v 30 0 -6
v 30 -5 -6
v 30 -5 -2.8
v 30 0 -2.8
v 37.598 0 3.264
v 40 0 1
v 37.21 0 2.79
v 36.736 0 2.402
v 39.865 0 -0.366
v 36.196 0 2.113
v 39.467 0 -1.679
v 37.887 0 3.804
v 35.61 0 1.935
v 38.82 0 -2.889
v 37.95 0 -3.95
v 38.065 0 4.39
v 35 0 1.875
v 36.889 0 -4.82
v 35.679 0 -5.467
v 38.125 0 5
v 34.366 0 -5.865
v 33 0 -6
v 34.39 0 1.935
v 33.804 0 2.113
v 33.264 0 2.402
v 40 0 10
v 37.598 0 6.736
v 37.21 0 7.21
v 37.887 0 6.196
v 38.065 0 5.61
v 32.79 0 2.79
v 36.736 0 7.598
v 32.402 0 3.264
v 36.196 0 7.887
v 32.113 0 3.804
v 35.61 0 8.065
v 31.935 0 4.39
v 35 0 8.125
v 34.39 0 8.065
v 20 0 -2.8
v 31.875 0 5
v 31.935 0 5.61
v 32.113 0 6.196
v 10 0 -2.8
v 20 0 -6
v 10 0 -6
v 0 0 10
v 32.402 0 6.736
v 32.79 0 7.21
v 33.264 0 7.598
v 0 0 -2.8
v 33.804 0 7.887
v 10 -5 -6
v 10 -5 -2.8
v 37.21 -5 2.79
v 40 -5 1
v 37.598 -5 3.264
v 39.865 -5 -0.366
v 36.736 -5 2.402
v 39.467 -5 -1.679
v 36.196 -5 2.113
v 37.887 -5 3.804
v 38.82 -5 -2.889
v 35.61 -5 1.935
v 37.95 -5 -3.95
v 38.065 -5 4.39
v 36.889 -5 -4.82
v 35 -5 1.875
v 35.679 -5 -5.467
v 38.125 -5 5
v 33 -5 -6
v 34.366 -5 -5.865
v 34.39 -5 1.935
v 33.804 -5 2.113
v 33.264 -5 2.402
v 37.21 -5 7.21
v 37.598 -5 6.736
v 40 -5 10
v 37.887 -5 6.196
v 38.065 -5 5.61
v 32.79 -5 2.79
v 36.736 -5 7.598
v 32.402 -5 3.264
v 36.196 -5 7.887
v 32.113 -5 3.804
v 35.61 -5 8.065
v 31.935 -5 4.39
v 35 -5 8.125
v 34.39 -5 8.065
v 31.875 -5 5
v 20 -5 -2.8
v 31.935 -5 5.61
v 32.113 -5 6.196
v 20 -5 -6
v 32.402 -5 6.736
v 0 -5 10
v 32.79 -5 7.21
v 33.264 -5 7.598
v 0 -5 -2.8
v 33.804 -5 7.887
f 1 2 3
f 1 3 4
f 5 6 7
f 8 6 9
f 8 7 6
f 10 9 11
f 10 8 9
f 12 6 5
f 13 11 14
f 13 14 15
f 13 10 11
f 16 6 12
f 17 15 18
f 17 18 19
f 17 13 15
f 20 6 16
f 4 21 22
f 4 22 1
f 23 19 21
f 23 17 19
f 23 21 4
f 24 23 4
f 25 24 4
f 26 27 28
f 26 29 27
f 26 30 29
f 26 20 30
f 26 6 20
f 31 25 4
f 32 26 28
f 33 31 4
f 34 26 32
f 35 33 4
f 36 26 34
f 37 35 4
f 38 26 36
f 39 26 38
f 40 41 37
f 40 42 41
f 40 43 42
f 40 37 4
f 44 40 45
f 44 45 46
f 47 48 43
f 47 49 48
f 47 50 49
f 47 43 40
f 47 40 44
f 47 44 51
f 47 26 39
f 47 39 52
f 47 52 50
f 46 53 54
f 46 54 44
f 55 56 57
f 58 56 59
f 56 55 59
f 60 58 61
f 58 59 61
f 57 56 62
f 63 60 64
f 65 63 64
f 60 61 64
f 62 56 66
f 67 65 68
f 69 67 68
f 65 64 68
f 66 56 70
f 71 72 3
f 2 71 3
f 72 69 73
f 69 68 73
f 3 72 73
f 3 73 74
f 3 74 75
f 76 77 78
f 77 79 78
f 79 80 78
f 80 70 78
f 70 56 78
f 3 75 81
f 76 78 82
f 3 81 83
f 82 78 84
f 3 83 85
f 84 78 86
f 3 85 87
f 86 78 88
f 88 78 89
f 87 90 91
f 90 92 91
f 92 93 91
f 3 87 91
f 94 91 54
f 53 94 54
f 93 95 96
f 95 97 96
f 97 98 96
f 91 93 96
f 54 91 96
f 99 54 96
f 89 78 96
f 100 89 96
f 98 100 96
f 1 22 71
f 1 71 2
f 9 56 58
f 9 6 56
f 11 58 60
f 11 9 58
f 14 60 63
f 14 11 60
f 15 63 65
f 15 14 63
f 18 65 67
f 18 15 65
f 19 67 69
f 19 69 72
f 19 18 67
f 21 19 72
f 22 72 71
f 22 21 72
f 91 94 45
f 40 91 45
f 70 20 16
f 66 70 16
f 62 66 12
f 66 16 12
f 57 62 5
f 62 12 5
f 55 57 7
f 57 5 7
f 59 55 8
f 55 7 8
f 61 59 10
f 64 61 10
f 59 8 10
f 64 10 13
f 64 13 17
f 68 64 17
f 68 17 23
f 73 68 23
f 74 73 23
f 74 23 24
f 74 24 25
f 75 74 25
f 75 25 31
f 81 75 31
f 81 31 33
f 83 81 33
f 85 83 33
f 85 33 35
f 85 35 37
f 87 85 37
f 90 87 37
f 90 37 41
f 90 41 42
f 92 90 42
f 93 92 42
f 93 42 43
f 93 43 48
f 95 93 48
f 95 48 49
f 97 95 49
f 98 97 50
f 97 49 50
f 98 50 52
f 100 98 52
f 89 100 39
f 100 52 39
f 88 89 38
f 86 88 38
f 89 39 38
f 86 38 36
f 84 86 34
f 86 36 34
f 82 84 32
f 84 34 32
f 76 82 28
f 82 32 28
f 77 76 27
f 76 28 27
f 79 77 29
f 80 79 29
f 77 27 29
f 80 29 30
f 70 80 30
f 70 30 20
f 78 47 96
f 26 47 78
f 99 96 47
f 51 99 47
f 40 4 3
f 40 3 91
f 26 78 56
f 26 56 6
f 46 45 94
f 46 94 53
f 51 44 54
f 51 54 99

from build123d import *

# Parameters (mm, degrees)
ESQUISSE1_W                = 40
ESQUISSE1_H                = 5
BOSS_EXTRU_1_DEPTH         = 10
ESQUISSE2_R                = 3.125
ENL_V_MAT_EXTRU_1_DEPTH    = 6
ESQUISSE3_W                = 40
ESQUISSE3_H                = 5
BOSS_EXTRU_2_DEPTH         = 6
CONG_1_R                   = 7
ESQUISSE5_W                = 10
ESQUISSE5_H                = 5
ENL_V_MAT_EXTRU_3_DEPTH    = 3.2
R_P_TITION_LIN_AIRE1_COUNT = 2
R_P_TITION_LIN_AIRE1_PITCH = 20


with BuildPart() as part:
    # Esquisse1 → Boss.-Extru.1 (new body)
    with BuildSketch(Plane.XY):
        with Locations((20, -2.5)):
            Rectangle(ESQUISSE1_W, ESQUISSE1_H)
    extrude(amount=BOSS_EXTRU_1_DEPTH)

    # Esquisse2 → Enlèv. mat.-Extru.1 (cut, through all)
    with BuildSketch(Plane(origin=(0, 0, 0), x_dir=(1, 0, 0), z_dir=(0, 1, 0))):
        with Locations((35, -5)):
            Circle(ESQUISSE2_R)
    extrude(amount=-ENL_V_MAT_EXTRU_1_DEPTH, mode=Mode.SUBTRACT)

    # Esquisse3 → Boss.-Extru.2 (add)
    with BuildSketch(Plane(origin=(0, 0, 0), x_dir=(-1, 0, 0), z_dir=(0, 0, -1))):
        with Locations((-20, -2.5)):
            Rectangle(ESQUISSE3_W, ESQUISSE3_H)
    extrude(amount=BOSS_EXTRU_2_DEPTH)

    # Congé1
    cong_1_edges = [part.edges().sort_by_distance(p)[0] for p in [
        (40, -2.5, -6),
    ]]
    fillet(cong_1_edges, radius=CONG_1_R)

    # Esquisse5 → Enlèv. mat.-Extru.3 (cut)
    with BuildSketch(Plane(origin=(0, 0, -6), x_dir=(-1, 0, 0), z_dir=(0, 0, -1))):
        with Locations((-5, -2.5)):
            Rectangle(ESQUISSE5_W, ESQUISSE5_H)
    enl_v_mat_extru_3 = extrude(amount=-ENL_V_MAT_EXTRU_3_DEPTH, mode=Mode.SUBTRACT)

    # Répétition linéaire1: Enlèv. mat.-Extru.3 ×2
    with Locations(*[(i * R_P_TITION_LIN_AIRE1_PITCH, 0, 0) for i in range(1, R_P_TITION_LIN_AIRE1_COUNT)]):
        add(enl_v_mat_extru_3, mode=Mode.SUBTRACT)


solid = part.part
